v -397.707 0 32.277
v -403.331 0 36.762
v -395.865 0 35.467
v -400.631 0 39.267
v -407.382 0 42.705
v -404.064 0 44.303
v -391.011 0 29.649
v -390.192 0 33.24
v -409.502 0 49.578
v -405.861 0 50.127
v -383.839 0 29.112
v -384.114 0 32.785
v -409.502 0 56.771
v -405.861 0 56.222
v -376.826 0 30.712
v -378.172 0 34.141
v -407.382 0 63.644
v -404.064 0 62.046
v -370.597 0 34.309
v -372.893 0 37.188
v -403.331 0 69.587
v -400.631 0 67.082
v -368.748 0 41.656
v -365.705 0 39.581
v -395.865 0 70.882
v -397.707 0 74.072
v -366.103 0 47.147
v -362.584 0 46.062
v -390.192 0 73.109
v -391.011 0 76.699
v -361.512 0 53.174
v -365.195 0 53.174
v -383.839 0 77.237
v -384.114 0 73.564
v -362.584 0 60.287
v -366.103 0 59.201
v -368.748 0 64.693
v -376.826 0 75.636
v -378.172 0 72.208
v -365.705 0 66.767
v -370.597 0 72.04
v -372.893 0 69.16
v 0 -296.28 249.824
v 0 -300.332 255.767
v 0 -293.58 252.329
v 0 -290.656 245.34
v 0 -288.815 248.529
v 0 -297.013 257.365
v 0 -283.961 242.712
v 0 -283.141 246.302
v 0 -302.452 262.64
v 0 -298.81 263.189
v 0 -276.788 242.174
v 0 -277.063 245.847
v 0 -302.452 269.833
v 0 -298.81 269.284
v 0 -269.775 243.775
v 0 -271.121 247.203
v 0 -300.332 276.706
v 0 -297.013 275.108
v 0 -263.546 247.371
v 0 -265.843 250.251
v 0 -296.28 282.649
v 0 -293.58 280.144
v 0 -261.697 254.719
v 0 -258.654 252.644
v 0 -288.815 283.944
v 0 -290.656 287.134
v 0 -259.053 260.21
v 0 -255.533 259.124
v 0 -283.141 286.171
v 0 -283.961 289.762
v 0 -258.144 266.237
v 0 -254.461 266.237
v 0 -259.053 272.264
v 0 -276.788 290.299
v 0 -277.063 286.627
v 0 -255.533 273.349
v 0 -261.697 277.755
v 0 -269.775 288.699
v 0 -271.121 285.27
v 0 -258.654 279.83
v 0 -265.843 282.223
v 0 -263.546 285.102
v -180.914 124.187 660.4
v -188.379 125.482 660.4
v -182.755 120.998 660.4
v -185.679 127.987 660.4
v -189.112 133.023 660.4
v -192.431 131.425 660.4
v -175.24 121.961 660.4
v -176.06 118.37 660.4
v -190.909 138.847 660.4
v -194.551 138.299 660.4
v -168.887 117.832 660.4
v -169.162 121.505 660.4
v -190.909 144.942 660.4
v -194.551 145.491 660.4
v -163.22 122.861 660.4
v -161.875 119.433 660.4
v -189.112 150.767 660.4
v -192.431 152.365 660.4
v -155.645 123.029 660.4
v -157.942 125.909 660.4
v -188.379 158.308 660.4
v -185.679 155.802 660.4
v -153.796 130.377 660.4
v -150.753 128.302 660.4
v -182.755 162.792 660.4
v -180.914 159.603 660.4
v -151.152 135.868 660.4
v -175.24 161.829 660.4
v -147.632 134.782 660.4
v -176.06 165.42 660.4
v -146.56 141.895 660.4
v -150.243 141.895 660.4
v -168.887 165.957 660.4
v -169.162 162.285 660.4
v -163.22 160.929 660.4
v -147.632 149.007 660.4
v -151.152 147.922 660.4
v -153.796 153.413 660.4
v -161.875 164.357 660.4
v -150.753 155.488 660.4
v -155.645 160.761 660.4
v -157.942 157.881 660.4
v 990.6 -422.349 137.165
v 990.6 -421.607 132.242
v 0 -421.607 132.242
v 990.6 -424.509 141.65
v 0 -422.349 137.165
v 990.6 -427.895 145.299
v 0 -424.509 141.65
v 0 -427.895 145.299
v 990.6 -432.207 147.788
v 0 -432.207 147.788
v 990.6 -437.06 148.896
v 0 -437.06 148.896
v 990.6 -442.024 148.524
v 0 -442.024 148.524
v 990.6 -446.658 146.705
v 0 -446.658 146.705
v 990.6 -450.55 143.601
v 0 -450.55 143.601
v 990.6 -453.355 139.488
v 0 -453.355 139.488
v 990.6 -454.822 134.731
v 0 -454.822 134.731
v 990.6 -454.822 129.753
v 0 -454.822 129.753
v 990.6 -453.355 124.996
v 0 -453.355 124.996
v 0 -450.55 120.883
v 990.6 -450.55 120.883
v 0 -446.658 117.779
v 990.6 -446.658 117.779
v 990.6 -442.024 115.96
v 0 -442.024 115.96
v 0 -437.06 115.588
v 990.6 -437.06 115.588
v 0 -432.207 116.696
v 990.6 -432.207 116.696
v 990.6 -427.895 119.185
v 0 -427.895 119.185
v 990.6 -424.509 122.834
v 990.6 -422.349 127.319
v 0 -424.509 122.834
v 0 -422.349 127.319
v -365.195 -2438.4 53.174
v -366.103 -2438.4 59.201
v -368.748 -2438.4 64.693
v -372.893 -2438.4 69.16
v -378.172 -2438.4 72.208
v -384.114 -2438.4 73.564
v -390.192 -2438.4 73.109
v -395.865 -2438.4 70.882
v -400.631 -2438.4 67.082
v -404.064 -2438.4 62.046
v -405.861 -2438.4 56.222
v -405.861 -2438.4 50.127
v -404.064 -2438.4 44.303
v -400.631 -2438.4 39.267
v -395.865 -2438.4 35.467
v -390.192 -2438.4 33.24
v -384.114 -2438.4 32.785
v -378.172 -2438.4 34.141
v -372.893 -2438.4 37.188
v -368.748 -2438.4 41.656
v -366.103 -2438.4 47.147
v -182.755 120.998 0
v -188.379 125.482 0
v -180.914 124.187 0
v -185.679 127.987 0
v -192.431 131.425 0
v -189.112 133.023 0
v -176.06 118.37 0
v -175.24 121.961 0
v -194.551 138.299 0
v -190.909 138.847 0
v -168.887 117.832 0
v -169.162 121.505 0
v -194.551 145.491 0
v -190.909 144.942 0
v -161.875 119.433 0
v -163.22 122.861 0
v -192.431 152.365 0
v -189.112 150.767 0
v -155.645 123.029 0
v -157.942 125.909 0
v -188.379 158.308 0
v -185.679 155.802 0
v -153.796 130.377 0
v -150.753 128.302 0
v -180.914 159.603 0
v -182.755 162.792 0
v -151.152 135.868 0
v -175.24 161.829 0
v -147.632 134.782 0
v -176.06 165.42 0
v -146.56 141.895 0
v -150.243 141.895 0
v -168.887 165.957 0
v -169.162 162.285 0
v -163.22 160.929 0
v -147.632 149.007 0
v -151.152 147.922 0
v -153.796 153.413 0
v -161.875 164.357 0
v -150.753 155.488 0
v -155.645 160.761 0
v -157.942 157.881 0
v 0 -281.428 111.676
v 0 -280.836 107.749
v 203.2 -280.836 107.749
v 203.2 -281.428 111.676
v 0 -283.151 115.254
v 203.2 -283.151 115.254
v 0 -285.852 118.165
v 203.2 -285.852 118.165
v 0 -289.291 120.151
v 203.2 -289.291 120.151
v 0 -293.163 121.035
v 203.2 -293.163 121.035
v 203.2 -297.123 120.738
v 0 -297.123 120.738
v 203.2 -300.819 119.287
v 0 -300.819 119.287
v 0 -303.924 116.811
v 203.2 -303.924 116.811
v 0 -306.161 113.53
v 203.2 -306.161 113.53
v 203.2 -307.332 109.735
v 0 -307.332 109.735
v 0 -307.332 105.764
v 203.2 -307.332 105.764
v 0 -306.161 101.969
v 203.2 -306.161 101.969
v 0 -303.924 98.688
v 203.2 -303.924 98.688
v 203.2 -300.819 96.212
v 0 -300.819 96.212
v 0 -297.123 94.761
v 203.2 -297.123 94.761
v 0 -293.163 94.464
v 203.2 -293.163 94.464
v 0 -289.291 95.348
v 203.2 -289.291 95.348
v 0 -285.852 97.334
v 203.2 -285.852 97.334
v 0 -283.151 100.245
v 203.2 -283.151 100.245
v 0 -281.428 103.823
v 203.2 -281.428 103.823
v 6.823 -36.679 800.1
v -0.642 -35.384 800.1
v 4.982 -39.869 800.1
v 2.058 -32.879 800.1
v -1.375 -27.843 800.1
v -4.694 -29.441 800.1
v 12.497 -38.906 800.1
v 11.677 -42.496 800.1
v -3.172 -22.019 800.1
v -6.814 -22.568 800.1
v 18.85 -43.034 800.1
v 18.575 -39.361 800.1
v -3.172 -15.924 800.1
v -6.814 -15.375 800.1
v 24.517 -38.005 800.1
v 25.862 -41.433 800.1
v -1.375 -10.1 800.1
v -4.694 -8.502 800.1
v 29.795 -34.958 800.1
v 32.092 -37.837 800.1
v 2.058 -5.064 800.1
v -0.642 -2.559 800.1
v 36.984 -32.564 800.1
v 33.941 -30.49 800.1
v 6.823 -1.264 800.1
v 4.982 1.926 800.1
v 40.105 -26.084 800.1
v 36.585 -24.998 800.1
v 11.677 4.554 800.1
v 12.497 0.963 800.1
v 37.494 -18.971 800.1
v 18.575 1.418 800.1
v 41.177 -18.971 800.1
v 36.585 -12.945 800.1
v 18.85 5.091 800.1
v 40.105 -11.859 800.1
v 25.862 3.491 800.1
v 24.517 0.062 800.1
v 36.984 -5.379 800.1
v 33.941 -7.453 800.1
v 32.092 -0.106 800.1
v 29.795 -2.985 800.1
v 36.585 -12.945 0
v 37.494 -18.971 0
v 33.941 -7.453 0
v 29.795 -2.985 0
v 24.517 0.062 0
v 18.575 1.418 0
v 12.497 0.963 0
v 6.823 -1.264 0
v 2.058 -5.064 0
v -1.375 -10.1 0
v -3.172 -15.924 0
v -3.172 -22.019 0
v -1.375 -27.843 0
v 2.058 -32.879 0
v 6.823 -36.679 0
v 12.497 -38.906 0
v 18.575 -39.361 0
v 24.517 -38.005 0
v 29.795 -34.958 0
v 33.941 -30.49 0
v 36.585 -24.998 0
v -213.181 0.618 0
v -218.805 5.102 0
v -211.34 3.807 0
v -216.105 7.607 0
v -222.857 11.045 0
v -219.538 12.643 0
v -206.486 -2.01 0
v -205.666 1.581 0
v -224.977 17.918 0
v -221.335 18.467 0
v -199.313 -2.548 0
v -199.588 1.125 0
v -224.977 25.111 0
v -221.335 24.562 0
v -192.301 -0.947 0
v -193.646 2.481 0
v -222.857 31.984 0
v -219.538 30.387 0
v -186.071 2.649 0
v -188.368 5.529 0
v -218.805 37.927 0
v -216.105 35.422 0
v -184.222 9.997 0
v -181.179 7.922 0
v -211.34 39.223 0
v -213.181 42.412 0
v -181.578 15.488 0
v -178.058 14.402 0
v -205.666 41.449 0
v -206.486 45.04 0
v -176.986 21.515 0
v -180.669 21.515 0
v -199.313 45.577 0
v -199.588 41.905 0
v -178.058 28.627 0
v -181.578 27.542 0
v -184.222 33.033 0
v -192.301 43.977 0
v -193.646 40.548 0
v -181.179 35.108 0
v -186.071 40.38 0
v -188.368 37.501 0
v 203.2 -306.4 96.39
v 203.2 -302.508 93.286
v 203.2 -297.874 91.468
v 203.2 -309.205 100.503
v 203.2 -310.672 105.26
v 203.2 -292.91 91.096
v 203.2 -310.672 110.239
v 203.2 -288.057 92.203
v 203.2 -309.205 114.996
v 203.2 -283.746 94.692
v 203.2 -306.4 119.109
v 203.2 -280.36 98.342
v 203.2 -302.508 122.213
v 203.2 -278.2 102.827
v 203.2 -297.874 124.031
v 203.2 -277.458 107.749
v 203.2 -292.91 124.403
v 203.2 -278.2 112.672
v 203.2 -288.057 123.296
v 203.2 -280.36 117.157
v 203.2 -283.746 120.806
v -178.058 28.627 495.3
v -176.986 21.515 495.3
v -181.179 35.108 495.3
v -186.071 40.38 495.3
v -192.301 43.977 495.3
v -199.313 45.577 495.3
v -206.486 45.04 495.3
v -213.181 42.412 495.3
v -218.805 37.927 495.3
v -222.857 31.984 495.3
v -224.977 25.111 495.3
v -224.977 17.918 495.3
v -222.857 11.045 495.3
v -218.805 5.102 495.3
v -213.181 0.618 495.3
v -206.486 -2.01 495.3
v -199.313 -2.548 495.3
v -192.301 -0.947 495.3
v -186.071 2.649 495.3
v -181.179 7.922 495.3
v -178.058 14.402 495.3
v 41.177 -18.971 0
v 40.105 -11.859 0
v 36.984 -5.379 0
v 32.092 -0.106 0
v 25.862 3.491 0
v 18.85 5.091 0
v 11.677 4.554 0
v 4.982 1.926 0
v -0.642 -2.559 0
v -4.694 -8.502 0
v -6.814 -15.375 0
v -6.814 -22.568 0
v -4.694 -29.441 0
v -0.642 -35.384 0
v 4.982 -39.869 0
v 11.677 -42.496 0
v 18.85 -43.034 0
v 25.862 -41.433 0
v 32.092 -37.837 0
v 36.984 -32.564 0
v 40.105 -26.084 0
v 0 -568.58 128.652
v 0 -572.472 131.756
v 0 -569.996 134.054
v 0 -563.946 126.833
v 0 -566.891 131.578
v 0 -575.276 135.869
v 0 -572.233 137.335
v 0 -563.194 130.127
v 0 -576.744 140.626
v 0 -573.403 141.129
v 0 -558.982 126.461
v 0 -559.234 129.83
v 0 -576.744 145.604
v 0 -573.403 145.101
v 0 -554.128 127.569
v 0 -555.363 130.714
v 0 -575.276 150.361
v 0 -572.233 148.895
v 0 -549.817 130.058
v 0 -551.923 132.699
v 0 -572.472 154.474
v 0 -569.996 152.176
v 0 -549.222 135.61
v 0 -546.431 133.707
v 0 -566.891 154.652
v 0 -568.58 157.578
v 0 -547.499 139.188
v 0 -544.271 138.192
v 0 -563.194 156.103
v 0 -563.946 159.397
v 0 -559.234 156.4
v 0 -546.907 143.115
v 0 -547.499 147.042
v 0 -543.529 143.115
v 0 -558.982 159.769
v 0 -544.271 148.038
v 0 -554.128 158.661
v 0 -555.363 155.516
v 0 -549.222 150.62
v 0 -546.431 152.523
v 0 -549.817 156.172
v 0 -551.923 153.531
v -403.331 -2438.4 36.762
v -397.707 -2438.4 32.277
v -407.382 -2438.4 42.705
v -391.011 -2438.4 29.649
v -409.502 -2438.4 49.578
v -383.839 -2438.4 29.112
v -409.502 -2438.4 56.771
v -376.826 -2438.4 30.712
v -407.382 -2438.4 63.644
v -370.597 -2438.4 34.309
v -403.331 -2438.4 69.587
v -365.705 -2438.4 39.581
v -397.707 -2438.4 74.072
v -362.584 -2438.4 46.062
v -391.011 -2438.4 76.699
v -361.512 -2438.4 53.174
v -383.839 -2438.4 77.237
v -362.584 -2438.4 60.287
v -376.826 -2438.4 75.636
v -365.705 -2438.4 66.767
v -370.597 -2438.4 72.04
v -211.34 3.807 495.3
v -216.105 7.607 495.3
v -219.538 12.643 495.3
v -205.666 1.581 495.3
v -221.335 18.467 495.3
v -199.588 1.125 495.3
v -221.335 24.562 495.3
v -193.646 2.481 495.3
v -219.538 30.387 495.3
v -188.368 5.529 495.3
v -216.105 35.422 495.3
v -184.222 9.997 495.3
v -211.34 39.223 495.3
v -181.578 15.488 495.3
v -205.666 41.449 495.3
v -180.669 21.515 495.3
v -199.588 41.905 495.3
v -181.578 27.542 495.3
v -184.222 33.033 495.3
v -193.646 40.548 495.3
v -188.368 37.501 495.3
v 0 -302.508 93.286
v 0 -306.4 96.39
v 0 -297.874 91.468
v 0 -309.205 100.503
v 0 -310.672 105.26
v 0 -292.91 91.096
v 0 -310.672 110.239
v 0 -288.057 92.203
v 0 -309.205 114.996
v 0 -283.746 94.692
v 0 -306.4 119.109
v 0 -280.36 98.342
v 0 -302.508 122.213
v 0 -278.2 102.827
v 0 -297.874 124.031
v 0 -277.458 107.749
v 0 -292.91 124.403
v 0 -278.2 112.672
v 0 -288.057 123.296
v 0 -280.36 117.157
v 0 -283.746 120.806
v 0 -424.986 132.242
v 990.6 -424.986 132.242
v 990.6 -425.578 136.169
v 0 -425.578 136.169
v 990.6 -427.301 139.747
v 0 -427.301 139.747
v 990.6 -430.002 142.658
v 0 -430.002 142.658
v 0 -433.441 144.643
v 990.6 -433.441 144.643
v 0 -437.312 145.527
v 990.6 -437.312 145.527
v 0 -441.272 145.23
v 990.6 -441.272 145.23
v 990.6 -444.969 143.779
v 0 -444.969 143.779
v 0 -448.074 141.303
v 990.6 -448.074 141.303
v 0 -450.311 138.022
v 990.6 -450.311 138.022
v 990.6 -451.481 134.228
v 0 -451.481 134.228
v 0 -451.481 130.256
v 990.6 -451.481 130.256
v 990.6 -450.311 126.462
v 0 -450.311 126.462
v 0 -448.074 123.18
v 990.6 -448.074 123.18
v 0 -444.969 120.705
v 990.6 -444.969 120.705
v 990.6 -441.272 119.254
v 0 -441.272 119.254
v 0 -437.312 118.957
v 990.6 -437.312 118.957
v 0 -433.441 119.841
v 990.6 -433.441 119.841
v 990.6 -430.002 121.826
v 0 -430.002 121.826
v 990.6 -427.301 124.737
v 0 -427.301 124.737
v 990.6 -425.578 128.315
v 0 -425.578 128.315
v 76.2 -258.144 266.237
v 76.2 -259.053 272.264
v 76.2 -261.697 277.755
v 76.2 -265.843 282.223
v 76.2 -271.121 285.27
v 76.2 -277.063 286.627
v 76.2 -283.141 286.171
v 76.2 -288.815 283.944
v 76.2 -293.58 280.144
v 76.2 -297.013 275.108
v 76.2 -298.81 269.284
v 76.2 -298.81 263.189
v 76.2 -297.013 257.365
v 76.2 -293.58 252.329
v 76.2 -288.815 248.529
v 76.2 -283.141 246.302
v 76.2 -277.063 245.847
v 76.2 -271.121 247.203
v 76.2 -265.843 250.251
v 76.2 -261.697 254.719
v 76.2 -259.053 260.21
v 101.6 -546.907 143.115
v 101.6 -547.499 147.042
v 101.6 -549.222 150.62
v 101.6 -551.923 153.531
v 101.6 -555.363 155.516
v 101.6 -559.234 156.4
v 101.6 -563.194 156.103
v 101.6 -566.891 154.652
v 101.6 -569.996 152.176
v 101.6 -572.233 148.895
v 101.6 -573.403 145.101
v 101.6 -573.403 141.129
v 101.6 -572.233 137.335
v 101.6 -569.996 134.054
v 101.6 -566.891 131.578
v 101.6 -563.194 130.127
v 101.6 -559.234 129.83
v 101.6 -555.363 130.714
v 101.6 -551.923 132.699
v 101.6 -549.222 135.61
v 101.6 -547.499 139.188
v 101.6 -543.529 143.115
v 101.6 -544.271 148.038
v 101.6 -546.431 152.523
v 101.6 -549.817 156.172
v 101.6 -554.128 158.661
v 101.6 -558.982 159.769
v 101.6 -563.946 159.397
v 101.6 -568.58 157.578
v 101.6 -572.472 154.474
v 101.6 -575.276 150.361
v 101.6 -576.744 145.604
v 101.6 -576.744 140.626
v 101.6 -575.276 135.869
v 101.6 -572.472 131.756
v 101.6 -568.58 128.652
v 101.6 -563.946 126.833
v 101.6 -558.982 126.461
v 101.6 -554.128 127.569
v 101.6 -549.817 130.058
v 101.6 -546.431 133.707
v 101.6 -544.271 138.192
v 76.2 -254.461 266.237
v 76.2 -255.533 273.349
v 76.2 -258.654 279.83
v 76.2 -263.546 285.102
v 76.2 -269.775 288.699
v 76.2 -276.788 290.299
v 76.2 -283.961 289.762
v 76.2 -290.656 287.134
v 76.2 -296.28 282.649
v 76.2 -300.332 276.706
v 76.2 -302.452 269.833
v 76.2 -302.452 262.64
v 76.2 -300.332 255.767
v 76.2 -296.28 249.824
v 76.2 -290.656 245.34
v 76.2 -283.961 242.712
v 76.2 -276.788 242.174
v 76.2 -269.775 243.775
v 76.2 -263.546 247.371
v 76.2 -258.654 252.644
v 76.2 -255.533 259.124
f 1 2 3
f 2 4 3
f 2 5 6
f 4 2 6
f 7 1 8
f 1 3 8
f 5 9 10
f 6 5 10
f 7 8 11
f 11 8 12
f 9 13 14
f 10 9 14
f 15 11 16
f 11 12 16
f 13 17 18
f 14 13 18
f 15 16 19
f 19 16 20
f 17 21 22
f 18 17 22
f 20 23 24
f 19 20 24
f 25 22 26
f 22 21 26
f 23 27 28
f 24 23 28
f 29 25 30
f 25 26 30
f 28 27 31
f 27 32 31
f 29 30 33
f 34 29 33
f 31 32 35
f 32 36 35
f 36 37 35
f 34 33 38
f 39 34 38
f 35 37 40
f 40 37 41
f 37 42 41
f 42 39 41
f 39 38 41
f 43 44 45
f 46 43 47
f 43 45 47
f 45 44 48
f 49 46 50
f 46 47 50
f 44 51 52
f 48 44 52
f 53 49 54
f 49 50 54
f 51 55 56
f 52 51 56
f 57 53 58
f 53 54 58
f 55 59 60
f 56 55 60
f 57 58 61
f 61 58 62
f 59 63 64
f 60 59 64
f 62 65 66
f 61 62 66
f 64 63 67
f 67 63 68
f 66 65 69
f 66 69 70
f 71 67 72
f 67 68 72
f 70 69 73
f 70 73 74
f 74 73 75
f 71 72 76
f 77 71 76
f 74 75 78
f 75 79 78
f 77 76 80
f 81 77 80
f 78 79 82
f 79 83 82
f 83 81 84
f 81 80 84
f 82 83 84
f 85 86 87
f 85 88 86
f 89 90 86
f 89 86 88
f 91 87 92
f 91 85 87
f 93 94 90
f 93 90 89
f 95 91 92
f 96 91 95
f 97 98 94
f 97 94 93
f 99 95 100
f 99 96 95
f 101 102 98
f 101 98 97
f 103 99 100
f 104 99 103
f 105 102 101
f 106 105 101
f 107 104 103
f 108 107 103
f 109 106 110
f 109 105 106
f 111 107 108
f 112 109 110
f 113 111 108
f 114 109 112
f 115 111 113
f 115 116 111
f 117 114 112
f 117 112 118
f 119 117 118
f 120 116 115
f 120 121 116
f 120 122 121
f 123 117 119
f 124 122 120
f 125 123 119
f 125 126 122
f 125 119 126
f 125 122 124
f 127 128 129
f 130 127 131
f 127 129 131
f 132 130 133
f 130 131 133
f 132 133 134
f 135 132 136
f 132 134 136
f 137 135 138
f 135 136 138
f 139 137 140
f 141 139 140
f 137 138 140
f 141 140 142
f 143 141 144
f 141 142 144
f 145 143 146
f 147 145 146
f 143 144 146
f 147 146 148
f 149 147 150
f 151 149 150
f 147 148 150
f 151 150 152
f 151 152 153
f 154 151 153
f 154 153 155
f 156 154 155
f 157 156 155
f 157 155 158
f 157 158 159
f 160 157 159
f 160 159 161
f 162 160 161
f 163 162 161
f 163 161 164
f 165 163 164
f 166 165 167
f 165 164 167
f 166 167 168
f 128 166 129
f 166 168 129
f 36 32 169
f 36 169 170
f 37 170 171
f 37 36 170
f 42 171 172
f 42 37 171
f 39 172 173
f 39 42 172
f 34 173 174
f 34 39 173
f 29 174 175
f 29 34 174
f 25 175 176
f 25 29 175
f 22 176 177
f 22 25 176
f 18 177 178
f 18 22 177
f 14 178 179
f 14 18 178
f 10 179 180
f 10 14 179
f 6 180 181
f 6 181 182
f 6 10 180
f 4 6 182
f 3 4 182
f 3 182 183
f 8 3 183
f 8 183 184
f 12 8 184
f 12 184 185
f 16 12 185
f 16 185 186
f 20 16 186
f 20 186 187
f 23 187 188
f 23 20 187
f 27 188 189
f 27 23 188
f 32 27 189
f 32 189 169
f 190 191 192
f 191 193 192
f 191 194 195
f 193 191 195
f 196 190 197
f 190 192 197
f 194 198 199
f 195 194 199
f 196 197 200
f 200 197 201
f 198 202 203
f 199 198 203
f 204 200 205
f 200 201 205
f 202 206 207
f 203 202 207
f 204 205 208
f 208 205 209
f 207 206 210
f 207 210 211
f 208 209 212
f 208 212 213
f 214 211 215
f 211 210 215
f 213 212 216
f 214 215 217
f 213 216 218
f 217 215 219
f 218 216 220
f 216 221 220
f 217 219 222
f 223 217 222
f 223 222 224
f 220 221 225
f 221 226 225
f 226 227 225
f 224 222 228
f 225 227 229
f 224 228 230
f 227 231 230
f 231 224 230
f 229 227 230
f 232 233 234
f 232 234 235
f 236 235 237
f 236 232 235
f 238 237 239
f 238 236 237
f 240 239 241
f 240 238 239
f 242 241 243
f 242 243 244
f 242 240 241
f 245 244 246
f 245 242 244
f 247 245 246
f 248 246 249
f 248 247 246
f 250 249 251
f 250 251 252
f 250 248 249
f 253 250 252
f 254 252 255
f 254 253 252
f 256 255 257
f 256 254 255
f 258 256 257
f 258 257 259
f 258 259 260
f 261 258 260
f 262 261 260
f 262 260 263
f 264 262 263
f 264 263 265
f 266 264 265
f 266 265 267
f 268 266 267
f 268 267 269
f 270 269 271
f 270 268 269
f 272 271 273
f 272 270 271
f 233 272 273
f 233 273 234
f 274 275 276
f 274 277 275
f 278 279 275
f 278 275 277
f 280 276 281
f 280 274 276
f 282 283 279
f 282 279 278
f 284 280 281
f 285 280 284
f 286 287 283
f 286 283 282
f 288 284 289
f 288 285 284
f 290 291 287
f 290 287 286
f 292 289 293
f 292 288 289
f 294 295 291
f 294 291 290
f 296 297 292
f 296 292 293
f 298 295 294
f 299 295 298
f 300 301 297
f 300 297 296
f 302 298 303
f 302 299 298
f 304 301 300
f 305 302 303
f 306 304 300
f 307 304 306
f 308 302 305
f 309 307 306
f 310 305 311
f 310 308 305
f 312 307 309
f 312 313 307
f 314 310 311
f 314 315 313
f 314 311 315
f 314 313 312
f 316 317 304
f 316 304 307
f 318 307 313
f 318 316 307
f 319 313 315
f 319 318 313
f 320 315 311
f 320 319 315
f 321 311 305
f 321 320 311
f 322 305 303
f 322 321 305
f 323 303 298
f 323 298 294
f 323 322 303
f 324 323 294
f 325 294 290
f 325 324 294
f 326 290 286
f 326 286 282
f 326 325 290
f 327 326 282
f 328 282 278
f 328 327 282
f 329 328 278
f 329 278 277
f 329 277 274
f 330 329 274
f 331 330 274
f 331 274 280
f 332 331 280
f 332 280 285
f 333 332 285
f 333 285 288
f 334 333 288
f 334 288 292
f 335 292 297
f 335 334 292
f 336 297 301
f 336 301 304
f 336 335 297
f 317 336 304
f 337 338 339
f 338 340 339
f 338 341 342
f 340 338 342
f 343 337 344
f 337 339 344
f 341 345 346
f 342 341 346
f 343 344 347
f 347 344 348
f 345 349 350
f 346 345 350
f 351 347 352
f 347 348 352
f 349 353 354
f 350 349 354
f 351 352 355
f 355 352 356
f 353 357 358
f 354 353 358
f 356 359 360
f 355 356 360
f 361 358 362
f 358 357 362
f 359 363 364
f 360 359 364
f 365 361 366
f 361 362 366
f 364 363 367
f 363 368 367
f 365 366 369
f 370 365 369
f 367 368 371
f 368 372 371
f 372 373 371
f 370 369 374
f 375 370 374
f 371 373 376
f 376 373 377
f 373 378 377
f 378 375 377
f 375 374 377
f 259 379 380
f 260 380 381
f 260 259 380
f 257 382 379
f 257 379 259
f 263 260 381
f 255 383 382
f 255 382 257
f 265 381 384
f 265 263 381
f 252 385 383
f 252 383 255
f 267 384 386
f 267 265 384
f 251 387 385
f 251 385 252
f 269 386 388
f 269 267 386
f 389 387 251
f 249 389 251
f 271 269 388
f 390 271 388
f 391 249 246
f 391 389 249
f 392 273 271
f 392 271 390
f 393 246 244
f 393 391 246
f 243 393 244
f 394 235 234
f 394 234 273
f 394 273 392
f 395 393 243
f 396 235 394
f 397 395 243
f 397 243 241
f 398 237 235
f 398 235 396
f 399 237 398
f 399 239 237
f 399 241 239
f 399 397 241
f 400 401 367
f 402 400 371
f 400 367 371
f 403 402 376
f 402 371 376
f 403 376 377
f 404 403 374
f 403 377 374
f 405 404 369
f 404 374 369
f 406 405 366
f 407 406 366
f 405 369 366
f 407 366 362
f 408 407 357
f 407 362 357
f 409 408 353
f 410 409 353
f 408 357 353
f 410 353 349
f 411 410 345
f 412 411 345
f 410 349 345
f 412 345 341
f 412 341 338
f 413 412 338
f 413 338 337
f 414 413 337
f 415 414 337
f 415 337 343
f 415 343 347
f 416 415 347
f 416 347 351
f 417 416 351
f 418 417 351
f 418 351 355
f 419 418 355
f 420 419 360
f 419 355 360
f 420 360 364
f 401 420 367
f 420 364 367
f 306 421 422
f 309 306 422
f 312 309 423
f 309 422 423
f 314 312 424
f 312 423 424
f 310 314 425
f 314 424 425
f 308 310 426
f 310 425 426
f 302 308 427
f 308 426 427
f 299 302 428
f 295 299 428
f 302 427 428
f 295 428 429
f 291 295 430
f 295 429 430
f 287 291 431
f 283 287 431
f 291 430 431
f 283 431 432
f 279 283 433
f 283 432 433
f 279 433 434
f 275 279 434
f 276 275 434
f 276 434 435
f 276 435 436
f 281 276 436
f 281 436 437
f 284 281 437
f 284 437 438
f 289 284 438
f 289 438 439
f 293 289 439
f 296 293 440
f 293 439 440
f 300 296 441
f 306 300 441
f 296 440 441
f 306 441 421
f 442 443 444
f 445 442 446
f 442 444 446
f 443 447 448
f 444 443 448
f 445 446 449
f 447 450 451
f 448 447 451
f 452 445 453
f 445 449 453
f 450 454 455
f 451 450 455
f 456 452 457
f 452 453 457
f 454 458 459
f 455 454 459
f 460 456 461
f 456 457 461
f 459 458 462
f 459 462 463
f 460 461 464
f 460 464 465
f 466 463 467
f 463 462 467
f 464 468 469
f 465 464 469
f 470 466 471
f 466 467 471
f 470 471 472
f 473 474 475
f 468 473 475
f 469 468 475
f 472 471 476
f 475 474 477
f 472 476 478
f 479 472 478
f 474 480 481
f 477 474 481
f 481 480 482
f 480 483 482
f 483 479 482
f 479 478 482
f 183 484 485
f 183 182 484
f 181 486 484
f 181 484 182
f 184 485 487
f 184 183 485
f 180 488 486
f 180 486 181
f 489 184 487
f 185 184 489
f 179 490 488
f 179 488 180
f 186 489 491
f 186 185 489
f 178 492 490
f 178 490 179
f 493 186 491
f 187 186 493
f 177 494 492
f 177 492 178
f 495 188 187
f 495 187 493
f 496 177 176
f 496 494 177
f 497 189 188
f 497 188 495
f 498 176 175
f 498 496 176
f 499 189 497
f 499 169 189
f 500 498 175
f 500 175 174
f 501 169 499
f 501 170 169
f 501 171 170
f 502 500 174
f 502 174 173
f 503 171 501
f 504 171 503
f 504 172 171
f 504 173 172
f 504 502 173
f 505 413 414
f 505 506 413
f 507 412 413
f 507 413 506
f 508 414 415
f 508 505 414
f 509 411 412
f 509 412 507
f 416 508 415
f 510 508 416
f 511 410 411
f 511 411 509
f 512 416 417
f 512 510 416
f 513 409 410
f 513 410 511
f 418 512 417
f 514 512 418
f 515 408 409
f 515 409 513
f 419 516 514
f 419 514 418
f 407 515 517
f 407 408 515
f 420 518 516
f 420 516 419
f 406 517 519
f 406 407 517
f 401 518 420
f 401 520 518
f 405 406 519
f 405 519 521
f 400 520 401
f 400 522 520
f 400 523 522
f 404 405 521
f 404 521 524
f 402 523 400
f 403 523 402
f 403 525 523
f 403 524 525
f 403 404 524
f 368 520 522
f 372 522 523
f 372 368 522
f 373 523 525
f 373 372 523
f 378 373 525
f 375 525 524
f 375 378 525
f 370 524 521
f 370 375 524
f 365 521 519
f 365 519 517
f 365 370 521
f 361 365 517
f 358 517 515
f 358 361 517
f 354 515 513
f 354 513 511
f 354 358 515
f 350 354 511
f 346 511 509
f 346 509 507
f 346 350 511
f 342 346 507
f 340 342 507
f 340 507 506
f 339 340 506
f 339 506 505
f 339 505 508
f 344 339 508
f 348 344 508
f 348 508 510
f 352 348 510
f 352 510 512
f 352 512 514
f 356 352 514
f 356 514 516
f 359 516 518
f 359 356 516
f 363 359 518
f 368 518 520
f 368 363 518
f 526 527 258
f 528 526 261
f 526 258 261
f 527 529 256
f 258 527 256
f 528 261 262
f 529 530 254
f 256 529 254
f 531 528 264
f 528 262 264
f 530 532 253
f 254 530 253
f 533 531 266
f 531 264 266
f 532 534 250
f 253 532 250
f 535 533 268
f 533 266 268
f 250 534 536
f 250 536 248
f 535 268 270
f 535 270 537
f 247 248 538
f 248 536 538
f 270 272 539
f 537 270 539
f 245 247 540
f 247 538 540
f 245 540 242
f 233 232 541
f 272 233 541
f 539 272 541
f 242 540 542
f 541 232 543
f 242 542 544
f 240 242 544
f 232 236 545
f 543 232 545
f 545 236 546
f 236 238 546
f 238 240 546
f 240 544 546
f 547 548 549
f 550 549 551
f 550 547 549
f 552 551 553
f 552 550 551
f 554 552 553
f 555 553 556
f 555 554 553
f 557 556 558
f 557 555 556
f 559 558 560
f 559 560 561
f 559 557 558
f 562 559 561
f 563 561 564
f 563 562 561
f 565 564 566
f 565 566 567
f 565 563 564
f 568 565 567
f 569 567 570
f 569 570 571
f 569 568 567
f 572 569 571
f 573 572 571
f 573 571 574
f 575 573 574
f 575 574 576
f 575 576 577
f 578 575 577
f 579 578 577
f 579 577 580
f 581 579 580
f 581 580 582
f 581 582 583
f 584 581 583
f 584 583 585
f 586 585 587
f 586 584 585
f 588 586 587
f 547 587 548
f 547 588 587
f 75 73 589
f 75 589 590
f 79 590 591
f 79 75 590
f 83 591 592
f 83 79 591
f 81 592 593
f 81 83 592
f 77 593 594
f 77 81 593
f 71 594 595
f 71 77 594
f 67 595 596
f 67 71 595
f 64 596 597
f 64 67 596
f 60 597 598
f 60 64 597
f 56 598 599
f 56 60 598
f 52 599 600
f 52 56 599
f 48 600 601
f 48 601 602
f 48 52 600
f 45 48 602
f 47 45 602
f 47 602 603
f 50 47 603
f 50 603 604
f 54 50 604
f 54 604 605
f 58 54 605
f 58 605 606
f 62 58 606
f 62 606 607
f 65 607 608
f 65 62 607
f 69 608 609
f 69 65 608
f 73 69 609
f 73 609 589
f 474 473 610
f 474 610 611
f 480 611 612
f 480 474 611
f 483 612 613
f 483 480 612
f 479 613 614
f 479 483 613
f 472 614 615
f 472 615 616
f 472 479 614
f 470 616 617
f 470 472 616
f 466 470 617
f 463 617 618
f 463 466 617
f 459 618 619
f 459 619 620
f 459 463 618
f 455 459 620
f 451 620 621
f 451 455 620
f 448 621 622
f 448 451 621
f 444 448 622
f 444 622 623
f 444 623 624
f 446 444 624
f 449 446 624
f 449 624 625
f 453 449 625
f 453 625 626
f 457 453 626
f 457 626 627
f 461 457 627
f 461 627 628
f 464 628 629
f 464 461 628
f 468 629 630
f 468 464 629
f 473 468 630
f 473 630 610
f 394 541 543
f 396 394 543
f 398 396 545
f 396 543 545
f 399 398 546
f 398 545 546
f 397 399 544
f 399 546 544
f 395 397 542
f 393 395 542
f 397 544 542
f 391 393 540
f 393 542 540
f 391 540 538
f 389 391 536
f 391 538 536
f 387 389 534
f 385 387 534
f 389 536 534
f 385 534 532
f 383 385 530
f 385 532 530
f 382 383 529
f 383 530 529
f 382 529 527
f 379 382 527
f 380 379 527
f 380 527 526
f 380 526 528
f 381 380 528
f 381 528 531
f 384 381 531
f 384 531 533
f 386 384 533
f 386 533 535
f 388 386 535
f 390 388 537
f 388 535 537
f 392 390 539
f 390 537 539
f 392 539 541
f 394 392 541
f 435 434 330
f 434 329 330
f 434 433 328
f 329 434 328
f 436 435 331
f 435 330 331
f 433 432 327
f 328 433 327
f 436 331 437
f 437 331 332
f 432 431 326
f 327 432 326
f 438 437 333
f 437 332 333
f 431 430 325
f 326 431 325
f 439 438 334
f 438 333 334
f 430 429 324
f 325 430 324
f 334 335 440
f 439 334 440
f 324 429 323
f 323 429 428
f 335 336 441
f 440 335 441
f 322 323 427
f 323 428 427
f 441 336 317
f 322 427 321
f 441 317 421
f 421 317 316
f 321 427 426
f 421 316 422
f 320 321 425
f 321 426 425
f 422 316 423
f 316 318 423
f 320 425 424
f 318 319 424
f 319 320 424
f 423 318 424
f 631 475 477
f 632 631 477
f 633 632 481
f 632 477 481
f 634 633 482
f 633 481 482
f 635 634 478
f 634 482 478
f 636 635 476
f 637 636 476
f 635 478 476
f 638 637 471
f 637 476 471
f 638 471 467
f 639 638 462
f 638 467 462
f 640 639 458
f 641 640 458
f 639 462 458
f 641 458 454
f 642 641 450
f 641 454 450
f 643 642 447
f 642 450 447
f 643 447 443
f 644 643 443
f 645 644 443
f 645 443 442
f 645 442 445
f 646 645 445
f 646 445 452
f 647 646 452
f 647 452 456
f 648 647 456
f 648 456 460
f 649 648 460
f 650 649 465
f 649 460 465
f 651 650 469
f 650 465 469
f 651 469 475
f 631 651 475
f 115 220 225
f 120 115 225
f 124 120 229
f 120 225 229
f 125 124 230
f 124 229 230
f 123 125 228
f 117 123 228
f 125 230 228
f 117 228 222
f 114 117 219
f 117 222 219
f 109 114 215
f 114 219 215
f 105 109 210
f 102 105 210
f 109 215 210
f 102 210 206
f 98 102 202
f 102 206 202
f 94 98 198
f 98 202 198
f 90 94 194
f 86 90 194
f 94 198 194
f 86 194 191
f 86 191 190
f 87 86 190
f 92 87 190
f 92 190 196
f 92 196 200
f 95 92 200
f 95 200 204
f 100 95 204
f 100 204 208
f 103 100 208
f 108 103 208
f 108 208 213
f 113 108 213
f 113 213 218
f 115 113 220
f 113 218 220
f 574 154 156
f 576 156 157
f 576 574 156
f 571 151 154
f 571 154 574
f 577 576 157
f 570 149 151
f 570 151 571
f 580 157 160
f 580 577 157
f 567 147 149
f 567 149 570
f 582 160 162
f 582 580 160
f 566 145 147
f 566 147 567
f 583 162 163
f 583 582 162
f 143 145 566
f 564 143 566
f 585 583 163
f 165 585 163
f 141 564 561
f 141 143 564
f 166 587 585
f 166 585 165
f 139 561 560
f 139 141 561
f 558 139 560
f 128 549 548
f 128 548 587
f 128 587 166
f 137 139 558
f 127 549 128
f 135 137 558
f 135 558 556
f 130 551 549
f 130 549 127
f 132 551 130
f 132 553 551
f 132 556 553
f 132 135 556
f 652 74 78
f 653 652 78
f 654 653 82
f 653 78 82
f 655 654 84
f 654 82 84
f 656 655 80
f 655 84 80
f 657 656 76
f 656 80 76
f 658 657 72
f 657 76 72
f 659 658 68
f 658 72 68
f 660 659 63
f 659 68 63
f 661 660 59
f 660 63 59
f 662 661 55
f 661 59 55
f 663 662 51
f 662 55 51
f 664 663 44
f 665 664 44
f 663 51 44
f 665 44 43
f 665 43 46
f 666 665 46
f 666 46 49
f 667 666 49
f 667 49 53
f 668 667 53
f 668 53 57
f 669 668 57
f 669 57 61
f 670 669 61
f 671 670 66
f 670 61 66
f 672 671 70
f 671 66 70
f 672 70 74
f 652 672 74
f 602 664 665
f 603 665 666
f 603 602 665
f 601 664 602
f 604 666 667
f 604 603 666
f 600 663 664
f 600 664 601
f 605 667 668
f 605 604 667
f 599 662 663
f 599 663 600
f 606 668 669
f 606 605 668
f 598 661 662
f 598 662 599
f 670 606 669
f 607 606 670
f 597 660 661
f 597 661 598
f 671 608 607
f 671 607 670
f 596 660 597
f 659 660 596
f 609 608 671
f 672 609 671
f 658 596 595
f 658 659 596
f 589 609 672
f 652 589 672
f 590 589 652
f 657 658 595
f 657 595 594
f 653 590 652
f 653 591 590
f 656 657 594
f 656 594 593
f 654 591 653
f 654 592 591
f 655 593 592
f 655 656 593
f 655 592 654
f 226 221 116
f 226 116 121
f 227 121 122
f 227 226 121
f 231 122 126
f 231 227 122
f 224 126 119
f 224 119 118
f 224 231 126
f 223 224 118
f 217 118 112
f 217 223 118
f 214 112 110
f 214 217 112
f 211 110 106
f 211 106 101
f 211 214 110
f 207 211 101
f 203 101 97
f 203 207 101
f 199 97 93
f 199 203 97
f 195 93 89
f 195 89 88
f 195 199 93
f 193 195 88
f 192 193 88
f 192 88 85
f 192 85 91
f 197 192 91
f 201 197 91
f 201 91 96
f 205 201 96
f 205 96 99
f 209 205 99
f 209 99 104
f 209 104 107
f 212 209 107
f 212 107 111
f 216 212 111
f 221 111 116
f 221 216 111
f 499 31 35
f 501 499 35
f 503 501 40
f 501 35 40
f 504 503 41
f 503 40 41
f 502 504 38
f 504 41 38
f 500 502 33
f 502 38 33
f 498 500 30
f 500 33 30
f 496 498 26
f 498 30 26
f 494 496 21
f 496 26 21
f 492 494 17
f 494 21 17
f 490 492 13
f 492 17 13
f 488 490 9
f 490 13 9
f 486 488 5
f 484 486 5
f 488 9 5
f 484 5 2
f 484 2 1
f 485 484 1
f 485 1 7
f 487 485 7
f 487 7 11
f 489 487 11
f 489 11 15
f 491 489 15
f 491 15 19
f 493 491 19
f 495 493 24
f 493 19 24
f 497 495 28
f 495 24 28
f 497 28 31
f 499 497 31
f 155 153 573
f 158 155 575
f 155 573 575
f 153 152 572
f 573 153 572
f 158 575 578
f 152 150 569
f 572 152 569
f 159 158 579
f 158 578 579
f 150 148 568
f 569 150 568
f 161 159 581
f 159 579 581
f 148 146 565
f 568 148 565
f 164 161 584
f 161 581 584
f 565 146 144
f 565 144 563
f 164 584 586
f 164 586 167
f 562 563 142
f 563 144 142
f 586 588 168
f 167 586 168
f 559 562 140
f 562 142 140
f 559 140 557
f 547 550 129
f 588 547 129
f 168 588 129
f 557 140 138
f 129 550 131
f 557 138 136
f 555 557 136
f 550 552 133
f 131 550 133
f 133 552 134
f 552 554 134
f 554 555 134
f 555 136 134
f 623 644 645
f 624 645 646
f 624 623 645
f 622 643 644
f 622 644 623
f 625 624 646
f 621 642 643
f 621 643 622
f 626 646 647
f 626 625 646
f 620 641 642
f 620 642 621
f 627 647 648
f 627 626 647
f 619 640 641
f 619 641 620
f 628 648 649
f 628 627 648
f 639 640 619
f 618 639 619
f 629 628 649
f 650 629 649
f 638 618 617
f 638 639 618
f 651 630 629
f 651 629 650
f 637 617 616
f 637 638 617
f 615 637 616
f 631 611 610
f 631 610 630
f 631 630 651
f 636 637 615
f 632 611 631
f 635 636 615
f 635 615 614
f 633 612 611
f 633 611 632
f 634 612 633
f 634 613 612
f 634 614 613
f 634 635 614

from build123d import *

# Parameters (mm, degrees)
F0_R      = 24.13
F0_R_2    = 20.447
F1_DEPTH  = 800.1
F2_R      = 24.13
F2_R_2    = 20.447
F3_DEPTH  = 660.4
F4_R      = 24.13
F4_R_2    = 20.447
F5_DEPTH  = 495.3
F6_R      = 24.13
F6_R_2    = 20.447
F7_DEPTH  = 76.2
F8_R      = 16.7005
F8_R_2    = 13.3223
F9_DEPTH  = 203.2
F10_R     = 16.7005
F10_R_2   = 13.3223
F11_DEPTH = 990.6
F12_R     = 16.7005
F12_R_2   = 13.3223
F13_DEPTH = 101.6
F14_R     = 24.13
F14_R_2   = 20.447
F15_DEPTH = 2438.4


with BuildPart() as f1:
    # F0 (on Top) → F1 (new body)
    with BuildSketch(Plane.XY):
        with Locations((17.046805, -18.971443)):
            Circle(F0_R)
        with Locations((17.046805, -18.971443)):
            Circle(F0_R_2, mode=Mode.SUBTRACT)
    extrude(amount=F1_DEPTH)


with BuildPart() as f3:
    # F2 (on Top) → F3 (new body)
    with BuildSketch(Plane.XY):
        with Locations((-170.690179, 141.894937)):
            Circle(F2_R)
        with Locations((-170.690179, 141.894937)):
            Circle(F2_R_2, mode=Mode.SUBTRACT)
    extrude(amount=F3_DEPTH)


with BuildPart() as f5:
    # F4 (on Top) → F5 (new body)
    with BuildSketch(Plane.XY):
        with Locations((-201.116279, 21.514883)):
            Circle(F4_R)
        with Locations((-201.116279, 21.514883)):
            Circle(F4_R_2, mode=Mode.SUBTRACT)
    extrude(amount=F5_DEPTH)


with BuildPart() as f7:
    # F6 (on Right) → F7 (new body)
    with BuildSketch(Plane.YZ):
        with Locations((-278.591126, 266.236752)):
            Circle(F6_R)
        with Locations((-278.591126, 266.236752)):
            Circle(F6_R_2, mode=Mode.SUBTRACT)
    extrude(amount=F7_DEPTH)


with BuildPart() as f9:
    # F8 (on Right) → F9 (new body)
    with BuildSketch(Plane.YZ):
        with Locations((-294.158101, 107.74947)):
            Circle(F8_R)
        with Locations((-294.158101, 107.74947)):
            Circle(F8_R_2, mode=Mode.SUBTRACT)
    extrude(amount=F9_DEPTH)


with BuildPart() as f11:
    # F10 (on Right) → F11 (new body)
    with BuildSketch(Plane.YZ):
        with Locations((-438.307941, 132.241964)):
            Circle(F10_R)
        with Locations((-438.307941, 132.241964)):
            Circle(F10_R_2, mode=Mode.SUBTRACT)
    extrude(amount=F11_DEPTH)


with BuildPart() as f13:
    # F12 (on Right) → F13 (new body)
    with BuildSketch(Plane.YZ):
        with Locations((-560.229719, 143.115029)):
            Circle(F12_R)
        with Locations((-560.229719, 143.115029)):
            Circle(F12_R_2, mode=Mode.SUBTRACT)
    extrude(amount=F13_DEPTH)


with BuildPart() as f15:
    # F14 (on Front) → F15 (new body)
    with BuildSketch(Plane.XZ):
        with Locations((-385.641962, 53.174328)):
            Circle(F14_R)
        with Locations((-385.641962, 53.174328)):
            Circle(F14_R_2, mode=Mode.SUBTRACT)
    extrude(amount=F15_DEPTH)


solid = Compound([f1.part, f3.part, f5.part, f7.part, f9.part, f11.part, f13.part, f15.part])
